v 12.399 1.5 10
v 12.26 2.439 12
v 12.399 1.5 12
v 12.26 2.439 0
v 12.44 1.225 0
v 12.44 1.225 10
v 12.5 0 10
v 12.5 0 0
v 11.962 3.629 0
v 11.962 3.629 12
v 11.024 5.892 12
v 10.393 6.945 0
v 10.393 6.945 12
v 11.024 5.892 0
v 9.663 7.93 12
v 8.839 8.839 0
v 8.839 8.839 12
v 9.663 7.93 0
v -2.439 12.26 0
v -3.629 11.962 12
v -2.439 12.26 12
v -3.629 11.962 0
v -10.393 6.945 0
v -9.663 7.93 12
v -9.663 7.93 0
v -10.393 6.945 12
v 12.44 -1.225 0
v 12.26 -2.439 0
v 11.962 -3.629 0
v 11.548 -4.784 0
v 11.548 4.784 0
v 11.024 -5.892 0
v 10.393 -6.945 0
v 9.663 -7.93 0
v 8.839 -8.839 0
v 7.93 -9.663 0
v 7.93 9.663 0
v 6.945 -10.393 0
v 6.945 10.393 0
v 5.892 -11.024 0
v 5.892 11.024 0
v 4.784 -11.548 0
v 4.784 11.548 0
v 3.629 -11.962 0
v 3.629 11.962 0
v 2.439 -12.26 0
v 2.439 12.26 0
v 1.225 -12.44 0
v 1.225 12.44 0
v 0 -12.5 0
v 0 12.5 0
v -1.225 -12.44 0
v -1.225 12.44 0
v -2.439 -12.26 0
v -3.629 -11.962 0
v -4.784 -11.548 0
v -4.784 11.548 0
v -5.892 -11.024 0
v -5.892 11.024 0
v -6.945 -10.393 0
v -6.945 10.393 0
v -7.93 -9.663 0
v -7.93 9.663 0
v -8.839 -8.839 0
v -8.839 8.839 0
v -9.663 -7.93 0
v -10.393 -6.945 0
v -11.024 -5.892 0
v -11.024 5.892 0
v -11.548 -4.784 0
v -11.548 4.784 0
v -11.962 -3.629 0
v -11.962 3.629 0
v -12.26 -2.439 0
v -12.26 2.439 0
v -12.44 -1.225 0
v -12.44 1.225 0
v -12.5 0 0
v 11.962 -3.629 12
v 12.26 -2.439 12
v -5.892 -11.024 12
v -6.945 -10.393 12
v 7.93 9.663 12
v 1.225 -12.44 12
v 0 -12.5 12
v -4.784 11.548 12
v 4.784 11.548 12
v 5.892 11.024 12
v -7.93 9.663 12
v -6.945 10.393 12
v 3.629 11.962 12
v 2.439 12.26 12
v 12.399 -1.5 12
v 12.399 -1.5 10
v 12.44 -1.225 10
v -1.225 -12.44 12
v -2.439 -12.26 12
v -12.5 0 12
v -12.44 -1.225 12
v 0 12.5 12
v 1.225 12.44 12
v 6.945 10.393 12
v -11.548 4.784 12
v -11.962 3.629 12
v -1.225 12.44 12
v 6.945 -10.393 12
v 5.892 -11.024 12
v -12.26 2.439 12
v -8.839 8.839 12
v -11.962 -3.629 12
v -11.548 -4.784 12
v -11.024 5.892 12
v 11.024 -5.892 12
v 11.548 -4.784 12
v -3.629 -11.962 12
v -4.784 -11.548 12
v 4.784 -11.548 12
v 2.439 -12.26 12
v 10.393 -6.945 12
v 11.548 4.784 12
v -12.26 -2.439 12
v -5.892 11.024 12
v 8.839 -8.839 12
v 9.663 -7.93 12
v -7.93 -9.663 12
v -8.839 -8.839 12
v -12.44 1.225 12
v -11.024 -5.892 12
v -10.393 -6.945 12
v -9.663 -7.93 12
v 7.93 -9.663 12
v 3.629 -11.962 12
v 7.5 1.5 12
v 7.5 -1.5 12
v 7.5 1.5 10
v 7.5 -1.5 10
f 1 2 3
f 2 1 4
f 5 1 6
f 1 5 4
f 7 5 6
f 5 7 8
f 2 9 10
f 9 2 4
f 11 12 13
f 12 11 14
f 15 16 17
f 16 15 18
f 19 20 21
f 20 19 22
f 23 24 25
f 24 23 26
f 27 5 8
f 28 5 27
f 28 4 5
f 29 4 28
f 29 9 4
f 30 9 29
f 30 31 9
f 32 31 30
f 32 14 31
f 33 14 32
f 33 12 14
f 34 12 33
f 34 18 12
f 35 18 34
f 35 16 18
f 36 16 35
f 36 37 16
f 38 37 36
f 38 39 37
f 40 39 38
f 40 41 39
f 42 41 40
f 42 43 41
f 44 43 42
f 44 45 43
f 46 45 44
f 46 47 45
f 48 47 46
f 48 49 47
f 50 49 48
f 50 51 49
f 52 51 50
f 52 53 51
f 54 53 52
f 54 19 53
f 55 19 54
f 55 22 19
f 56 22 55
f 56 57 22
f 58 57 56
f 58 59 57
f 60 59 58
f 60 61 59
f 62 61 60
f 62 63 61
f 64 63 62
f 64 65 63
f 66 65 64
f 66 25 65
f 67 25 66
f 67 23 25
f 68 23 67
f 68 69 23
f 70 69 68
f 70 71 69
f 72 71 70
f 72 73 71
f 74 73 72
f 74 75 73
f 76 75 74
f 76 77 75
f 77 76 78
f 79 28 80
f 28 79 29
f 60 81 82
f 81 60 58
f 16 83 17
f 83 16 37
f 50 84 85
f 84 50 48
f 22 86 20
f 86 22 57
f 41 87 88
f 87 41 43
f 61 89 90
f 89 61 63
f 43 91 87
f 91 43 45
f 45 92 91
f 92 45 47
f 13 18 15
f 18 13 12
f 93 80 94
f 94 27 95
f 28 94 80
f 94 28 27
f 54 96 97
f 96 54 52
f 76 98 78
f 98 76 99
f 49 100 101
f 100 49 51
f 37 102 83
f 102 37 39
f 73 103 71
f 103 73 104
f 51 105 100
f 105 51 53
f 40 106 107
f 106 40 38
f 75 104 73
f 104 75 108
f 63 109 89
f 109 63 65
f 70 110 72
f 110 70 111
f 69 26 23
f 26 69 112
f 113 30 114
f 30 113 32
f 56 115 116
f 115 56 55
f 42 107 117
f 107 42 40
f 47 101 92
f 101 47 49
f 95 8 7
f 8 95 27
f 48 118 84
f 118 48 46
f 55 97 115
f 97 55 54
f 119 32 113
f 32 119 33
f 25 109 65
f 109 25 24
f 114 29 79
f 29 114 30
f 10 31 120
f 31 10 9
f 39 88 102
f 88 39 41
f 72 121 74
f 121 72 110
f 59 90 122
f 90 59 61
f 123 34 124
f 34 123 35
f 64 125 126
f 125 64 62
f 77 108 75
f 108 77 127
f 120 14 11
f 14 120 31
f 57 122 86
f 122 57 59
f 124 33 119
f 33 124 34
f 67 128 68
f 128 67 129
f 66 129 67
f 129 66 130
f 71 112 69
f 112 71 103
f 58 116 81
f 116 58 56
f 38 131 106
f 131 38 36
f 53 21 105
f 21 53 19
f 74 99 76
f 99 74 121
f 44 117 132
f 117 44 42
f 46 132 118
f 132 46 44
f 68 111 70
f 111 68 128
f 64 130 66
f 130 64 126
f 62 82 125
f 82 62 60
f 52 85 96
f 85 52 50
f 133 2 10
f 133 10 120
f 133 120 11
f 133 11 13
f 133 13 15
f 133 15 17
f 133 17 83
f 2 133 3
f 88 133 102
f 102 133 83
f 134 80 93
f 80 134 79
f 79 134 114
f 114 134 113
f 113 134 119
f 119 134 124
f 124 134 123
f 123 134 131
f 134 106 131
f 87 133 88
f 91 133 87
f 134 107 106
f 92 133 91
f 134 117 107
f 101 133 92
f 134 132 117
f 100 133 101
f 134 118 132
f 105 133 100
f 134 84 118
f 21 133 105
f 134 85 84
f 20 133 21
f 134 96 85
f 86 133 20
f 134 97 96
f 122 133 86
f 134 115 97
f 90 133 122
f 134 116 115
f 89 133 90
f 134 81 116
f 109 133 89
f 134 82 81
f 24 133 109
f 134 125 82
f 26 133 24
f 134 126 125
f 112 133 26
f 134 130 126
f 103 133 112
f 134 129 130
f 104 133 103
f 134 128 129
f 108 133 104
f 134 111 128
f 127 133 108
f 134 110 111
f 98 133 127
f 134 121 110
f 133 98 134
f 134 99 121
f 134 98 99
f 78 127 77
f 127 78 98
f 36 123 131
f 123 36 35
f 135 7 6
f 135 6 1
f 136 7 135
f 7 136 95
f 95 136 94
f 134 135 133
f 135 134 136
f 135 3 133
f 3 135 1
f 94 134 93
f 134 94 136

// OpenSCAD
$fn = 64;


difference() {
    cylinder(d=25, h=12);
    translate([10,0,12])cube([5,3,4], center=true);
}
